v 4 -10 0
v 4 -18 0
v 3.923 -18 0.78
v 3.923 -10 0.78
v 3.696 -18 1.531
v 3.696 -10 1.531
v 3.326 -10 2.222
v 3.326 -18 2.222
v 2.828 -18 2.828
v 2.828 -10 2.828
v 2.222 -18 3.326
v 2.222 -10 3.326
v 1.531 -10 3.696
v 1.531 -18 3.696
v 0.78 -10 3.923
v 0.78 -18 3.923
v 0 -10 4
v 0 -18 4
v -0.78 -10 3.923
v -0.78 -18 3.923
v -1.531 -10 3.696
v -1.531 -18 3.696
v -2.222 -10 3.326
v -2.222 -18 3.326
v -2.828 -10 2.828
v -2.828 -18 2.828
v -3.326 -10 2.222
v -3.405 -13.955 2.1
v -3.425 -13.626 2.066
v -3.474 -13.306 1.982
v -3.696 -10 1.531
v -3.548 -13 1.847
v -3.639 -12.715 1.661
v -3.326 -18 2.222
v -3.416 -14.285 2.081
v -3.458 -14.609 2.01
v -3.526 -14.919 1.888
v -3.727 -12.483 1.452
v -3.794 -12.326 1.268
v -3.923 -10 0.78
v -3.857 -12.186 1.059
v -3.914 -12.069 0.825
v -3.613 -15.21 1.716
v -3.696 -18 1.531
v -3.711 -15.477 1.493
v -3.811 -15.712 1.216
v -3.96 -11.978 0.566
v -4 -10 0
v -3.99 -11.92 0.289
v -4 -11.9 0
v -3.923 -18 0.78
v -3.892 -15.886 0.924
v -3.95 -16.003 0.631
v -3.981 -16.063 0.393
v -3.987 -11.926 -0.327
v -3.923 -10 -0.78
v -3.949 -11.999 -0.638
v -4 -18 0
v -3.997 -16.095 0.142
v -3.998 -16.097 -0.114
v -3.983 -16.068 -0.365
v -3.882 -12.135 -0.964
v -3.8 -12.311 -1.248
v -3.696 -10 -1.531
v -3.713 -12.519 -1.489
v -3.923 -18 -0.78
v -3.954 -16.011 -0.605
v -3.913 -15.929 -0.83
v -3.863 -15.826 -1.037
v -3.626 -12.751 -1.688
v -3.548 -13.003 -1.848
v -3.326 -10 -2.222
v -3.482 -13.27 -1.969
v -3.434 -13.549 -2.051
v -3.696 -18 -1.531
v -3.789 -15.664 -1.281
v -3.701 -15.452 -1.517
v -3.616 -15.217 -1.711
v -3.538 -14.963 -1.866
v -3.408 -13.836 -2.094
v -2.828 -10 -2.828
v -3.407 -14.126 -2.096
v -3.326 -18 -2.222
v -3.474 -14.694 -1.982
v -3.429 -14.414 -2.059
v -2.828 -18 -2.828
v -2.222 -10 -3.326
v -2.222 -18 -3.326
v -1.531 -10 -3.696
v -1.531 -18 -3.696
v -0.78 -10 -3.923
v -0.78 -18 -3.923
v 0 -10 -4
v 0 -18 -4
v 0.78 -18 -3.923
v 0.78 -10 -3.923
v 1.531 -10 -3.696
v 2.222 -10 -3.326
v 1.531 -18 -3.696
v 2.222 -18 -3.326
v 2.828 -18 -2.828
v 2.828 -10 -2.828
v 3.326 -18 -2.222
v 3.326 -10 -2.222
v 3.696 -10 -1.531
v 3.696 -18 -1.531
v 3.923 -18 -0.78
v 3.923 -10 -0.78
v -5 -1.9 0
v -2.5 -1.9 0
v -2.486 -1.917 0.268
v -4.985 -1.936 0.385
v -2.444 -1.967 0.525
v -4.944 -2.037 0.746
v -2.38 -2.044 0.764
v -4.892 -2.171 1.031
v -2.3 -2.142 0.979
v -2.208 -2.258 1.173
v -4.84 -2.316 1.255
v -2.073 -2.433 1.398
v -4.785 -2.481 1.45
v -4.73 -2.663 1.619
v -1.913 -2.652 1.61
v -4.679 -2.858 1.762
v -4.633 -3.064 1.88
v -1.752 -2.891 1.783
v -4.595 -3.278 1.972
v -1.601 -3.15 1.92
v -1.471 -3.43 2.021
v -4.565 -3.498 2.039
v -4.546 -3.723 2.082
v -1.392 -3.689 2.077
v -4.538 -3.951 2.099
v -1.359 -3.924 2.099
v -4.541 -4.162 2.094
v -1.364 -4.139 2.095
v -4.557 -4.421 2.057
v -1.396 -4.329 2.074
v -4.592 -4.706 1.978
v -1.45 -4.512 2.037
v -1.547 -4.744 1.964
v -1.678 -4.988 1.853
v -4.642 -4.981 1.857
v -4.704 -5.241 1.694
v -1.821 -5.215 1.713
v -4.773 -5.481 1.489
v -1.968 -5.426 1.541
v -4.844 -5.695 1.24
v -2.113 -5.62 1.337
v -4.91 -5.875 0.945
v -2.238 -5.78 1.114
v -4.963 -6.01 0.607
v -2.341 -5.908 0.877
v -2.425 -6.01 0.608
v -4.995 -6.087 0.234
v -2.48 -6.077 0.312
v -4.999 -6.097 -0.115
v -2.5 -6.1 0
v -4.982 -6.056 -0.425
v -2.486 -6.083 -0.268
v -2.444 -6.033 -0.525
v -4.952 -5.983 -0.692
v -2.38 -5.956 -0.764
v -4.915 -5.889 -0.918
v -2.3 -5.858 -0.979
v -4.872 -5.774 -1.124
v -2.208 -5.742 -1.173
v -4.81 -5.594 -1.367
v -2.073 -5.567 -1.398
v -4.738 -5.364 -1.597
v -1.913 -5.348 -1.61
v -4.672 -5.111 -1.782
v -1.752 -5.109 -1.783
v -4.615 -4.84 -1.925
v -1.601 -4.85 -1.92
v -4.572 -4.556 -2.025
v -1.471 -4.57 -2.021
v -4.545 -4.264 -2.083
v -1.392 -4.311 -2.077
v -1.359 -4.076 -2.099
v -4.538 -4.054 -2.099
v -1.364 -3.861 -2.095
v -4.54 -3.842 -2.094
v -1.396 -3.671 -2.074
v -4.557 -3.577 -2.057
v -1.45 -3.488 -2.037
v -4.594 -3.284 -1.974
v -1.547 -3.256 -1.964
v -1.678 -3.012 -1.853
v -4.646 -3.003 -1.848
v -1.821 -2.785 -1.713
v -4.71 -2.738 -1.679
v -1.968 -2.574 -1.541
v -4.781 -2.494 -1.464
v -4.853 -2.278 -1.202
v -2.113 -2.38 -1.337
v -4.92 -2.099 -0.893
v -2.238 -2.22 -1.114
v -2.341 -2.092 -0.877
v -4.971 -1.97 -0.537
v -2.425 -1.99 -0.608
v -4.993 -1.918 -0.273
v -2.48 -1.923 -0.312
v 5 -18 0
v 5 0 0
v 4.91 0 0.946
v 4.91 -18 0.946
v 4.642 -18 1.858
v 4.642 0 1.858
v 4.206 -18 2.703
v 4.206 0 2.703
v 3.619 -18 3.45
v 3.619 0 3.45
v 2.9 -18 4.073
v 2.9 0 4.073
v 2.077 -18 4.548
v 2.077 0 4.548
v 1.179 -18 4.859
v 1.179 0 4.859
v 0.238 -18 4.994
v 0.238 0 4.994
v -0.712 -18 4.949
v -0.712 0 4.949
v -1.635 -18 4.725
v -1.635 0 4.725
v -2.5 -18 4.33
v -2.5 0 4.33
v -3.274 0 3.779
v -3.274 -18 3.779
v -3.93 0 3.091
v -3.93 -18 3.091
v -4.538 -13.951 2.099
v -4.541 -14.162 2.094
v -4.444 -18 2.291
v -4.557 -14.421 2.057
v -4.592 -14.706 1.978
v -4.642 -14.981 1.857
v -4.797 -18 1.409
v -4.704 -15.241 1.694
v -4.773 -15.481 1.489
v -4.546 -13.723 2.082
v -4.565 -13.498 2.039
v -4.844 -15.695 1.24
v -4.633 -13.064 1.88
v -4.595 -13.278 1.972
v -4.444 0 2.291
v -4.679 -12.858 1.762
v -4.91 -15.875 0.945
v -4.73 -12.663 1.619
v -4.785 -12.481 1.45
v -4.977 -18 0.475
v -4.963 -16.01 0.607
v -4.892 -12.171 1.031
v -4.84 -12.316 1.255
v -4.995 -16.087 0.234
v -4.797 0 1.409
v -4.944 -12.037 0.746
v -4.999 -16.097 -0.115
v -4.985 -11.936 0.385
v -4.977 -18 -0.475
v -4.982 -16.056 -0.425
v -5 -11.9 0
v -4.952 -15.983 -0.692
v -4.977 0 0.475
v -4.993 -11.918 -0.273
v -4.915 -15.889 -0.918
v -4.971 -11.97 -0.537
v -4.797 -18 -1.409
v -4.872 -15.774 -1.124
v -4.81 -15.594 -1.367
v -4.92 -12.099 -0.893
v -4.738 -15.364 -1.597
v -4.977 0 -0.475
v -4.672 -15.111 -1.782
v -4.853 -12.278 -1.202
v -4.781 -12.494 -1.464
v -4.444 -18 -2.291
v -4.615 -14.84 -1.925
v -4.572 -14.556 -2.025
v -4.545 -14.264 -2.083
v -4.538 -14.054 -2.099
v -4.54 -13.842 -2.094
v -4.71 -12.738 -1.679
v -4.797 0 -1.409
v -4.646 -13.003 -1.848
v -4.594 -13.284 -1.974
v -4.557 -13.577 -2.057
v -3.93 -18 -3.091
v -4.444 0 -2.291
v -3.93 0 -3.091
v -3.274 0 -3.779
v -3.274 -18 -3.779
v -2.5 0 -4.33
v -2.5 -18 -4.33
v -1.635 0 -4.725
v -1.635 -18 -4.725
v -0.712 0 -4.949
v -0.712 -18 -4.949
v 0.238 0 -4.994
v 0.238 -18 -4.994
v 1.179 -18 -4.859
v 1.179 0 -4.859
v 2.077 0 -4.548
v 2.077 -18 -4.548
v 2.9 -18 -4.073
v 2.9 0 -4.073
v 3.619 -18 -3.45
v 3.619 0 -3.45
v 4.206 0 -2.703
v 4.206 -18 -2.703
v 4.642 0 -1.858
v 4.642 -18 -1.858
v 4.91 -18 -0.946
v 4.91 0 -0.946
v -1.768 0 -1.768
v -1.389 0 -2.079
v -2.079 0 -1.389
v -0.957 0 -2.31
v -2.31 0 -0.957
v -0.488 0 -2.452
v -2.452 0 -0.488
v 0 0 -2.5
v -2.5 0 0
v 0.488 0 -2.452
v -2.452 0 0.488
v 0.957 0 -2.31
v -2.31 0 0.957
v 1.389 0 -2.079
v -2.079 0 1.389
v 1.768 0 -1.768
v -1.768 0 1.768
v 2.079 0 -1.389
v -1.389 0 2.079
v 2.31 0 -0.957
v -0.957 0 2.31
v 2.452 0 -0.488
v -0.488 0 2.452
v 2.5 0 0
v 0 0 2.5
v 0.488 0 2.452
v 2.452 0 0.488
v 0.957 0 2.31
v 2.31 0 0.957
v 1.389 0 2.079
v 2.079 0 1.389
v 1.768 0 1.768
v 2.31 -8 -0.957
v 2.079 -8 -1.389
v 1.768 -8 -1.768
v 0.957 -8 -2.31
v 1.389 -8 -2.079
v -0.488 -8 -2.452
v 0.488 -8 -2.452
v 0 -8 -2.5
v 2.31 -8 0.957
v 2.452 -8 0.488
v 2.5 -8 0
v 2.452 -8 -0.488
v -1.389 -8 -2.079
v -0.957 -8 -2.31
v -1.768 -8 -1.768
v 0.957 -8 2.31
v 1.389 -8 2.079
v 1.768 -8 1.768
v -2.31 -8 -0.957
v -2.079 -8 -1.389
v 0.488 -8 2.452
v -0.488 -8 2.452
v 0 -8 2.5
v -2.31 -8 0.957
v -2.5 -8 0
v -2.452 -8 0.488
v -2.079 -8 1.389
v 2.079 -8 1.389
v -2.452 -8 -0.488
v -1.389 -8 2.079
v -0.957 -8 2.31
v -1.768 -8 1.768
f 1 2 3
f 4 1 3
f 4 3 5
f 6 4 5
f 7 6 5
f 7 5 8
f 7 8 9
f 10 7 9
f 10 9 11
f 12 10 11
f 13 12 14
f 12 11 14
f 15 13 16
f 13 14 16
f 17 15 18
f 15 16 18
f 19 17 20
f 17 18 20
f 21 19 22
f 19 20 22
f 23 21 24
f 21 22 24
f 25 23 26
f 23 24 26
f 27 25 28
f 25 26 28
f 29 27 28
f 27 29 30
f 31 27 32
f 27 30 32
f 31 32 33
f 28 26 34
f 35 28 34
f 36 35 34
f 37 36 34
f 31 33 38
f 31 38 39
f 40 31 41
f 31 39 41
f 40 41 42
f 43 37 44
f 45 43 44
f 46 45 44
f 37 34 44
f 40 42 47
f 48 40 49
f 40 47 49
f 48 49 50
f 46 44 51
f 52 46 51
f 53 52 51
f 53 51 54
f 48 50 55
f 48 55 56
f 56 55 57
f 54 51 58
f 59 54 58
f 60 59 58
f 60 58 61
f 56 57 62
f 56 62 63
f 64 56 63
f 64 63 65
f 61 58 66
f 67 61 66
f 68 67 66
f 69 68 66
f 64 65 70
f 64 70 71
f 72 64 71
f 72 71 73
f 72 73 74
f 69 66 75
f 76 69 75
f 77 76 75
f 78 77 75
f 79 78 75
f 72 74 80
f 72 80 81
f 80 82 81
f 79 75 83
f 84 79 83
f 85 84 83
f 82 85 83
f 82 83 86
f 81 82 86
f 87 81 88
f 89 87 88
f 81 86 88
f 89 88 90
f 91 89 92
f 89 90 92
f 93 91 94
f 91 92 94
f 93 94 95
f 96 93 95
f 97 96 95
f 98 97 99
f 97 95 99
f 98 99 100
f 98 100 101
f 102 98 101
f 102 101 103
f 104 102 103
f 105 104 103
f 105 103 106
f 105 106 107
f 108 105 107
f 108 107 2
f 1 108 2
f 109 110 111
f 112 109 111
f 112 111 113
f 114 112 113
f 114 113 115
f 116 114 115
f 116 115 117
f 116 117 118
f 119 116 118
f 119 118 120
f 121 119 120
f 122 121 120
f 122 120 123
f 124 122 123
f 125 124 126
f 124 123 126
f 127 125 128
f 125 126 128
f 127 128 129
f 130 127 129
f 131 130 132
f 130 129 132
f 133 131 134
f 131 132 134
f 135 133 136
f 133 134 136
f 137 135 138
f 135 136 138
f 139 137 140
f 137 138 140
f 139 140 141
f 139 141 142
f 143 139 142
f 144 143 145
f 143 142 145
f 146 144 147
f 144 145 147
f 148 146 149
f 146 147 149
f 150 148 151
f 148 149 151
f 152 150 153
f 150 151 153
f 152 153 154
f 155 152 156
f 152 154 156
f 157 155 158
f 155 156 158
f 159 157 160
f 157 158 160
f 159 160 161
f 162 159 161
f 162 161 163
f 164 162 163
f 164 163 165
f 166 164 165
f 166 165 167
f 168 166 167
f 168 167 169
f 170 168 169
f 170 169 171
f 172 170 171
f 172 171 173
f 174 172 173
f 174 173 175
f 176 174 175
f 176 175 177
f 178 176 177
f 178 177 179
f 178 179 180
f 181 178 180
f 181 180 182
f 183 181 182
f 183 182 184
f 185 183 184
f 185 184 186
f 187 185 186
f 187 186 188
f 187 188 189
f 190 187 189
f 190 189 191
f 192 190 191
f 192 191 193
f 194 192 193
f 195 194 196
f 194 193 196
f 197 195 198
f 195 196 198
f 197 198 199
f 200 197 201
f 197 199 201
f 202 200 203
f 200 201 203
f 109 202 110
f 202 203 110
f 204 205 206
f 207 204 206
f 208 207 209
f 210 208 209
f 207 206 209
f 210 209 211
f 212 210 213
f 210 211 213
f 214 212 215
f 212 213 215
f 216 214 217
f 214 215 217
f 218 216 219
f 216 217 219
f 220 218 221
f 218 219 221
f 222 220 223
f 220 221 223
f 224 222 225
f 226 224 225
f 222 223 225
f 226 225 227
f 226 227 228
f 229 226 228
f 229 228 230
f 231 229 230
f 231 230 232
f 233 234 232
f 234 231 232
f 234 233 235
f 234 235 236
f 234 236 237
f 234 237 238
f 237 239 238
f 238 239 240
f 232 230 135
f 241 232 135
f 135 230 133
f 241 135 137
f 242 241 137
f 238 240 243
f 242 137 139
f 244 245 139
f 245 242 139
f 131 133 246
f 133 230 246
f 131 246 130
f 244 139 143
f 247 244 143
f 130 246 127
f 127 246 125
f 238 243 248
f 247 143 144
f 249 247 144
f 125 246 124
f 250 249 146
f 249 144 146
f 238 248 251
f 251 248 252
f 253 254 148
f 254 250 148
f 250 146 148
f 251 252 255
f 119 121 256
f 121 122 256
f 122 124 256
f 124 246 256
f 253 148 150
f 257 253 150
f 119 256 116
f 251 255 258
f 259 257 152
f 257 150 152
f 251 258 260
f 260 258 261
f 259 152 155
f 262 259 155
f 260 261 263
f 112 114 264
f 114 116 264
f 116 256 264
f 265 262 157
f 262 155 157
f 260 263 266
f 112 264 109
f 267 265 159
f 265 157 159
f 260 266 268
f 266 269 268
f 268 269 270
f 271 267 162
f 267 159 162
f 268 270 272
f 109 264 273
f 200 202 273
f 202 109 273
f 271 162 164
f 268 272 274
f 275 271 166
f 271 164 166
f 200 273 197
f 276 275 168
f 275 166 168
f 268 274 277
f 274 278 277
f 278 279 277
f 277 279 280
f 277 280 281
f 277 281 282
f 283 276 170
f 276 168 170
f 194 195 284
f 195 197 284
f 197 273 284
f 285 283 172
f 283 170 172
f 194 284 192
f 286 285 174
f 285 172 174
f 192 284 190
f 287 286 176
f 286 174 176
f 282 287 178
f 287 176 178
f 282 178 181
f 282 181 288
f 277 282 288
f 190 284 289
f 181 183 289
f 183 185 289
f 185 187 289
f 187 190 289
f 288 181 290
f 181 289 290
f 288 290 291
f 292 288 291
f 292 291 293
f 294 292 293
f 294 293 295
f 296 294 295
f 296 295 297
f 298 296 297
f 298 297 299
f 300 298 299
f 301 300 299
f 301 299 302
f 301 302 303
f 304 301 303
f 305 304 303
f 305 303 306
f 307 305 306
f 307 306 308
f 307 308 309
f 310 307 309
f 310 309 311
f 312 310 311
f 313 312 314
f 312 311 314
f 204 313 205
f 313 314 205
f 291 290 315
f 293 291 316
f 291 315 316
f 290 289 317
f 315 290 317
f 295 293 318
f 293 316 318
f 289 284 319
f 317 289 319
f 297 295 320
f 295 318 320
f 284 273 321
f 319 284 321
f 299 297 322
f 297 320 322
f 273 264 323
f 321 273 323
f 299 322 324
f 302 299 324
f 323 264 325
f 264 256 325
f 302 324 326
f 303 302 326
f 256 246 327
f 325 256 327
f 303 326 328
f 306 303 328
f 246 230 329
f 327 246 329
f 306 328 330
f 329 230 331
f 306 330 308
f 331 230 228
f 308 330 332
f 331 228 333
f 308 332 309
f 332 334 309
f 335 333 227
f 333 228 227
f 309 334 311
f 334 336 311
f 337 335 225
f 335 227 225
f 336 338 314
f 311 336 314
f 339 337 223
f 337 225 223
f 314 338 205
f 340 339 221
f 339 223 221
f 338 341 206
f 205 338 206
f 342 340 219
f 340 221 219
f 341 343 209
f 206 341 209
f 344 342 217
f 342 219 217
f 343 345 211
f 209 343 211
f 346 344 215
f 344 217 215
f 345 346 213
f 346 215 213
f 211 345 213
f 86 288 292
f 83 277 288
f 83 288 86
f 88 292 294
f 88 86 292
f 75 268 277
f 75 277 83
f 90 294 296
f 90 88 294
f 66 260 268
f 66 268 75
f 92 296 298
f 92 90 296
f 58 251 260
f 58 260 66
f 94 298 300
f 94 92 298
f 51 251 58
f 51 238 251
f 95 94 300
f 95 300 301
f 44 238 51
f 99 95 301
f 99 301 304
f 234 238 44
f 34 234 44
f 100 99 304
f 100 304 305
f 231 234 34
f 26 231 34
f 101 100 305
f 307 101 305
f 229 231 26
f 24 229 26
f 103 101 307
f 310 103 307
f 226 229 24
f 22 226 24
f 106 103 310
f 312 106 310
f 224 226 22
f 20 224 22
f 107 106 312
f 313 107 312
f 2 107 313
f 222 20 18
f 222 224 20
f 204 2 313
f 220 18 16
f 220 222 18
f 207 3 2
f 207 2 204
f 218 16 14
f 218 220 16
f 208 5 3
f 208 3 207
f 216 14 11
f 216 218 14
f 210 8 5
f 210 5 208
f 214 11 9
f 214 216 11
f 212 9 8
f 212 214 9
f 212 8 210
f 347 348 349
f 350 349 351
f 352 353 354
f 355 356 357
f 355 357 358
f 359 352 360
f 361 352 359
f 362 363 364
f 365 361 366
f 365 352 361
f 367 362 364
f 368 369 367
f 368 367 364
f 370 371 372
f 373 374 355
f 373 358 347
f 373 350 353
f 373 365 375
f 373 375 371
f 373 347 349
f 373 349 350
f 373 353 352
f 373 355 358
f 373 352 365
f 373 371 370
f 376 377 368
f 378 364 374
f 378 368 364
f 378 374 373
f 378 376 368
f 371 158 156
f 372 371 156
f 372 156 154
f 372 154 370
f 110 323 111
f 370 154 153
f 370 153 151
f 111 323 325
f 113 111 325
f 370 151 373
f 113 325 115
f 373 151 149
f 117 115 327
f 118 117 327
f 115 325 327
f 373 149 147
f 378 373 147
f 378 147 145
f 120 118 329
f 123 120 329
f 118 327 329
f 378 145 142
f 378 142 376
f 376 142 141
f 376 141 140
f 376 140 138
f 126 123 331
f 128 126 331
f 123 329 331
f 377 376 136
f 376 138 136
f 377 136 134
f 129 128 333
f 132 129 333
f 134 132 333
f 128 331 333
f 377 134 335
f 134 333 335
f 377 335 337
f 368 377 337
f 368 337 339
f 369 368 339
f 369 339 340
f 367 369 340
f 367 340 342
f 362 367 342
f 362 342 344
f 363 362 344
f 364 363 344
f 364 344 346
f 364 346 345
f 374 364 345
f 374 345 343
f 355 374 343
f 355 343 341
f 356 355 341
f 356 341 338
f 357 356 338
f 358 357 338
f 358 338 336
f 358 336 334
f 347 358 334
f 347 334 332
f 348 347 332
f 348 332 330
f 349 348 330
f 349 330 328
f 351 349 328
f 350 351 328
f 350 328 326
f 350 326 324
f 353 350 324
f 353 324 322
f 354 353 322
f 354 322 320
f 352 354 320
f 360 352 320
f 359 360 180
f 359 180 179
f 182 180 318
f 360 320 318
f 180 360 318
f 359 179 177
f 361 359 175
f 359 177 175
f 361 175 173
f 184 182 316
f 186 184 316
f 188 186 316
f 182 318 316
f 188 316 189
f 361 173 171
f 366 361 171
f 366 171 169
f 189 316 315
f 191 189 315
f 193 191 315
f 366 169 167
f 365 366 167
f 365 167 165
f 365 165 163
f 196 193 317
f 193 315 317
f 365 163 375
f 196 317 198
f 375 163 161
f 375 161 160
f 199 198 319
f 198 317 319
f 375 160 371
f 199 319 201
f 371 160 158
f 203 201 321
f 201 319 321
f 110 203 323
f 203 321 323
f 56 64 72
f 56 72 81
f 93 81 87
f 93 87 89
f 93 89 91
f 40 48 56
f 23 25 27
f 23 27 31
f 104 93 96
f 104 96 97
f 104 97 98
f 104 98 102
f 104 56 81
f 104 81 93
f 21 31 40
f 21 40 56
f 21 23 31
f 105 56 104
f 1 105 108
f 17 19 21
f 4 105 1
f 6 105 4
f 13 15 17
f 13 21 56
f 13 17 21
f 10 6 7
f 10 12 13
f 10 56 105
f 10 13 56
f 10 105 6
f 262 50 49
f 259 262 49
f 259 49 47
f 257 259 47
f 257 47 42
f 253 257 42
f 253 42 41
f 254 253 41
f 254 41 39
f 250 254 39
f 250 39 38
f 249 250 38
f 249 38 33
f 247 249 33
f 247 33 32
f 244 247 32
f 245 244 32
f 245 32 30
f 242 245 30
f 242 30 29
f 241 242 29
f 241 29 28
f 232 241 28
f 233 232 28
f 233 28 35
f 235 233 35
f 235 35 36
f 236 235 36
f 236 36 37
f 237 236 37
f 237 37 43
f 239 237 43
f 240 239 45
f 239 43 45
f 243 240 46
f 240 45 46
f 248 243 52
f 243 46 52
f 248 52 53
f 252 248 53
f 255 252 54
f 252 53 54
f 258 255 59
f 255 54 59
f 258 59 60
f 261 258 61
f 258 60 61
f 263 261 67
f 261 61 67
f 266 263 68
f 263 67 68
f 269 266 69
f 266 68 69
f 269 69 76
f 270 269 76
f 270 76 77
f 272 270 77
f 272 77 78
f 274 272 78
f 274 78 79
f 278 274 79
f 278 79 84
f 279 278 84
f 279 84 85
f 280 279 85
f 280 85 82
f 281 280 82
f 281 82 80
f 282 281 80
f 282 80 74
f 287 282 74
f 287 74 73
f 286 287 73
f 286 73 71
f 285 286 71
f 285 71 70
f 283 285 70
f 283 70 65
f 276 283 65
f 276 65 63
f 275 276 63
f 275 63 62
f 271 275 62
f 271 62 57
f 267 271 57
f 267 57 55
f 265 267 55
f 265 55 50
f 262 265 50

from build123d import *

# Parameters (mm, degrees)
F0_R     = 5
F1_DEPTH = 18
F2_R     = 4
F3_DEPTH = 8
F4_R     = 2.5
F5_DEPTH = 8
F7_D     = 4.2
F7_DEPTH = 14.4
F7_TIP   = 1.2618073
F8_D     = 4.2
F8_DEPTH = 14.4
F8_TIP   = 1.2618073


with BuildPart() as f1:
    # F0 (on Front) → F1 (new body)
    with BuildSketch(Plane.XZ):
        Circle(F0_R)
    extrude(amount=F1_DEPTH)

    # F2 (on face) → F3 (cut)
    with BuildSketch(Plane.XZ.offset(18)):
        Circle(F2_R)
    extrude(amount=-F3_DEPTH, mode=Mode.SUBTRACT)

    # F4 (on face) → F5 (cut)
    with BuildSketch(Plane(origin=(0, 0, 0), x_dir=(-1, 0, 0), z_dir=(0, 1, 0))):
        Circle(F4_R)
    extrude(amount=-F5_DEPTH, mode=Mode.SUBTRACT)

    # F7 (one way)
    with BuildSketch(Plane.YZ):
        with Locations((-4, 0)):
            Circle(F7_D / 2)
    extrude(amount=-F7_DEPTH, mode=Mode.SUBTRACT)
    with Locations(Plane.YZ):
        with Locations((-4, 0)):
            with Locations((0, 0, -(F7_DEPTH + F7_TIP / 2))):  # 118° drill point
                Cone(0, F7_D / 2, F7_TIP, mode=Mode.SUBTRACT)

    # F8 (one way)
    with BuildSketch(Plane.YZ):
        with Locations((-14, 0)):
            Circle(F8_D / 2)
    extrude(amount=-F8_DEPTH, mode=Mode.SUBTRACT)
    with Locations(Plane.YZ):
        with Locations((-14, 0)):
            with Locations((0, 0, -(F8_DEPTH + F8_TIP / 2))):  # 118° drill point
                Cone(0, F8_D / 2, F8_TIP, mode=Mode.SUBTRACT)


solid = f1.part
